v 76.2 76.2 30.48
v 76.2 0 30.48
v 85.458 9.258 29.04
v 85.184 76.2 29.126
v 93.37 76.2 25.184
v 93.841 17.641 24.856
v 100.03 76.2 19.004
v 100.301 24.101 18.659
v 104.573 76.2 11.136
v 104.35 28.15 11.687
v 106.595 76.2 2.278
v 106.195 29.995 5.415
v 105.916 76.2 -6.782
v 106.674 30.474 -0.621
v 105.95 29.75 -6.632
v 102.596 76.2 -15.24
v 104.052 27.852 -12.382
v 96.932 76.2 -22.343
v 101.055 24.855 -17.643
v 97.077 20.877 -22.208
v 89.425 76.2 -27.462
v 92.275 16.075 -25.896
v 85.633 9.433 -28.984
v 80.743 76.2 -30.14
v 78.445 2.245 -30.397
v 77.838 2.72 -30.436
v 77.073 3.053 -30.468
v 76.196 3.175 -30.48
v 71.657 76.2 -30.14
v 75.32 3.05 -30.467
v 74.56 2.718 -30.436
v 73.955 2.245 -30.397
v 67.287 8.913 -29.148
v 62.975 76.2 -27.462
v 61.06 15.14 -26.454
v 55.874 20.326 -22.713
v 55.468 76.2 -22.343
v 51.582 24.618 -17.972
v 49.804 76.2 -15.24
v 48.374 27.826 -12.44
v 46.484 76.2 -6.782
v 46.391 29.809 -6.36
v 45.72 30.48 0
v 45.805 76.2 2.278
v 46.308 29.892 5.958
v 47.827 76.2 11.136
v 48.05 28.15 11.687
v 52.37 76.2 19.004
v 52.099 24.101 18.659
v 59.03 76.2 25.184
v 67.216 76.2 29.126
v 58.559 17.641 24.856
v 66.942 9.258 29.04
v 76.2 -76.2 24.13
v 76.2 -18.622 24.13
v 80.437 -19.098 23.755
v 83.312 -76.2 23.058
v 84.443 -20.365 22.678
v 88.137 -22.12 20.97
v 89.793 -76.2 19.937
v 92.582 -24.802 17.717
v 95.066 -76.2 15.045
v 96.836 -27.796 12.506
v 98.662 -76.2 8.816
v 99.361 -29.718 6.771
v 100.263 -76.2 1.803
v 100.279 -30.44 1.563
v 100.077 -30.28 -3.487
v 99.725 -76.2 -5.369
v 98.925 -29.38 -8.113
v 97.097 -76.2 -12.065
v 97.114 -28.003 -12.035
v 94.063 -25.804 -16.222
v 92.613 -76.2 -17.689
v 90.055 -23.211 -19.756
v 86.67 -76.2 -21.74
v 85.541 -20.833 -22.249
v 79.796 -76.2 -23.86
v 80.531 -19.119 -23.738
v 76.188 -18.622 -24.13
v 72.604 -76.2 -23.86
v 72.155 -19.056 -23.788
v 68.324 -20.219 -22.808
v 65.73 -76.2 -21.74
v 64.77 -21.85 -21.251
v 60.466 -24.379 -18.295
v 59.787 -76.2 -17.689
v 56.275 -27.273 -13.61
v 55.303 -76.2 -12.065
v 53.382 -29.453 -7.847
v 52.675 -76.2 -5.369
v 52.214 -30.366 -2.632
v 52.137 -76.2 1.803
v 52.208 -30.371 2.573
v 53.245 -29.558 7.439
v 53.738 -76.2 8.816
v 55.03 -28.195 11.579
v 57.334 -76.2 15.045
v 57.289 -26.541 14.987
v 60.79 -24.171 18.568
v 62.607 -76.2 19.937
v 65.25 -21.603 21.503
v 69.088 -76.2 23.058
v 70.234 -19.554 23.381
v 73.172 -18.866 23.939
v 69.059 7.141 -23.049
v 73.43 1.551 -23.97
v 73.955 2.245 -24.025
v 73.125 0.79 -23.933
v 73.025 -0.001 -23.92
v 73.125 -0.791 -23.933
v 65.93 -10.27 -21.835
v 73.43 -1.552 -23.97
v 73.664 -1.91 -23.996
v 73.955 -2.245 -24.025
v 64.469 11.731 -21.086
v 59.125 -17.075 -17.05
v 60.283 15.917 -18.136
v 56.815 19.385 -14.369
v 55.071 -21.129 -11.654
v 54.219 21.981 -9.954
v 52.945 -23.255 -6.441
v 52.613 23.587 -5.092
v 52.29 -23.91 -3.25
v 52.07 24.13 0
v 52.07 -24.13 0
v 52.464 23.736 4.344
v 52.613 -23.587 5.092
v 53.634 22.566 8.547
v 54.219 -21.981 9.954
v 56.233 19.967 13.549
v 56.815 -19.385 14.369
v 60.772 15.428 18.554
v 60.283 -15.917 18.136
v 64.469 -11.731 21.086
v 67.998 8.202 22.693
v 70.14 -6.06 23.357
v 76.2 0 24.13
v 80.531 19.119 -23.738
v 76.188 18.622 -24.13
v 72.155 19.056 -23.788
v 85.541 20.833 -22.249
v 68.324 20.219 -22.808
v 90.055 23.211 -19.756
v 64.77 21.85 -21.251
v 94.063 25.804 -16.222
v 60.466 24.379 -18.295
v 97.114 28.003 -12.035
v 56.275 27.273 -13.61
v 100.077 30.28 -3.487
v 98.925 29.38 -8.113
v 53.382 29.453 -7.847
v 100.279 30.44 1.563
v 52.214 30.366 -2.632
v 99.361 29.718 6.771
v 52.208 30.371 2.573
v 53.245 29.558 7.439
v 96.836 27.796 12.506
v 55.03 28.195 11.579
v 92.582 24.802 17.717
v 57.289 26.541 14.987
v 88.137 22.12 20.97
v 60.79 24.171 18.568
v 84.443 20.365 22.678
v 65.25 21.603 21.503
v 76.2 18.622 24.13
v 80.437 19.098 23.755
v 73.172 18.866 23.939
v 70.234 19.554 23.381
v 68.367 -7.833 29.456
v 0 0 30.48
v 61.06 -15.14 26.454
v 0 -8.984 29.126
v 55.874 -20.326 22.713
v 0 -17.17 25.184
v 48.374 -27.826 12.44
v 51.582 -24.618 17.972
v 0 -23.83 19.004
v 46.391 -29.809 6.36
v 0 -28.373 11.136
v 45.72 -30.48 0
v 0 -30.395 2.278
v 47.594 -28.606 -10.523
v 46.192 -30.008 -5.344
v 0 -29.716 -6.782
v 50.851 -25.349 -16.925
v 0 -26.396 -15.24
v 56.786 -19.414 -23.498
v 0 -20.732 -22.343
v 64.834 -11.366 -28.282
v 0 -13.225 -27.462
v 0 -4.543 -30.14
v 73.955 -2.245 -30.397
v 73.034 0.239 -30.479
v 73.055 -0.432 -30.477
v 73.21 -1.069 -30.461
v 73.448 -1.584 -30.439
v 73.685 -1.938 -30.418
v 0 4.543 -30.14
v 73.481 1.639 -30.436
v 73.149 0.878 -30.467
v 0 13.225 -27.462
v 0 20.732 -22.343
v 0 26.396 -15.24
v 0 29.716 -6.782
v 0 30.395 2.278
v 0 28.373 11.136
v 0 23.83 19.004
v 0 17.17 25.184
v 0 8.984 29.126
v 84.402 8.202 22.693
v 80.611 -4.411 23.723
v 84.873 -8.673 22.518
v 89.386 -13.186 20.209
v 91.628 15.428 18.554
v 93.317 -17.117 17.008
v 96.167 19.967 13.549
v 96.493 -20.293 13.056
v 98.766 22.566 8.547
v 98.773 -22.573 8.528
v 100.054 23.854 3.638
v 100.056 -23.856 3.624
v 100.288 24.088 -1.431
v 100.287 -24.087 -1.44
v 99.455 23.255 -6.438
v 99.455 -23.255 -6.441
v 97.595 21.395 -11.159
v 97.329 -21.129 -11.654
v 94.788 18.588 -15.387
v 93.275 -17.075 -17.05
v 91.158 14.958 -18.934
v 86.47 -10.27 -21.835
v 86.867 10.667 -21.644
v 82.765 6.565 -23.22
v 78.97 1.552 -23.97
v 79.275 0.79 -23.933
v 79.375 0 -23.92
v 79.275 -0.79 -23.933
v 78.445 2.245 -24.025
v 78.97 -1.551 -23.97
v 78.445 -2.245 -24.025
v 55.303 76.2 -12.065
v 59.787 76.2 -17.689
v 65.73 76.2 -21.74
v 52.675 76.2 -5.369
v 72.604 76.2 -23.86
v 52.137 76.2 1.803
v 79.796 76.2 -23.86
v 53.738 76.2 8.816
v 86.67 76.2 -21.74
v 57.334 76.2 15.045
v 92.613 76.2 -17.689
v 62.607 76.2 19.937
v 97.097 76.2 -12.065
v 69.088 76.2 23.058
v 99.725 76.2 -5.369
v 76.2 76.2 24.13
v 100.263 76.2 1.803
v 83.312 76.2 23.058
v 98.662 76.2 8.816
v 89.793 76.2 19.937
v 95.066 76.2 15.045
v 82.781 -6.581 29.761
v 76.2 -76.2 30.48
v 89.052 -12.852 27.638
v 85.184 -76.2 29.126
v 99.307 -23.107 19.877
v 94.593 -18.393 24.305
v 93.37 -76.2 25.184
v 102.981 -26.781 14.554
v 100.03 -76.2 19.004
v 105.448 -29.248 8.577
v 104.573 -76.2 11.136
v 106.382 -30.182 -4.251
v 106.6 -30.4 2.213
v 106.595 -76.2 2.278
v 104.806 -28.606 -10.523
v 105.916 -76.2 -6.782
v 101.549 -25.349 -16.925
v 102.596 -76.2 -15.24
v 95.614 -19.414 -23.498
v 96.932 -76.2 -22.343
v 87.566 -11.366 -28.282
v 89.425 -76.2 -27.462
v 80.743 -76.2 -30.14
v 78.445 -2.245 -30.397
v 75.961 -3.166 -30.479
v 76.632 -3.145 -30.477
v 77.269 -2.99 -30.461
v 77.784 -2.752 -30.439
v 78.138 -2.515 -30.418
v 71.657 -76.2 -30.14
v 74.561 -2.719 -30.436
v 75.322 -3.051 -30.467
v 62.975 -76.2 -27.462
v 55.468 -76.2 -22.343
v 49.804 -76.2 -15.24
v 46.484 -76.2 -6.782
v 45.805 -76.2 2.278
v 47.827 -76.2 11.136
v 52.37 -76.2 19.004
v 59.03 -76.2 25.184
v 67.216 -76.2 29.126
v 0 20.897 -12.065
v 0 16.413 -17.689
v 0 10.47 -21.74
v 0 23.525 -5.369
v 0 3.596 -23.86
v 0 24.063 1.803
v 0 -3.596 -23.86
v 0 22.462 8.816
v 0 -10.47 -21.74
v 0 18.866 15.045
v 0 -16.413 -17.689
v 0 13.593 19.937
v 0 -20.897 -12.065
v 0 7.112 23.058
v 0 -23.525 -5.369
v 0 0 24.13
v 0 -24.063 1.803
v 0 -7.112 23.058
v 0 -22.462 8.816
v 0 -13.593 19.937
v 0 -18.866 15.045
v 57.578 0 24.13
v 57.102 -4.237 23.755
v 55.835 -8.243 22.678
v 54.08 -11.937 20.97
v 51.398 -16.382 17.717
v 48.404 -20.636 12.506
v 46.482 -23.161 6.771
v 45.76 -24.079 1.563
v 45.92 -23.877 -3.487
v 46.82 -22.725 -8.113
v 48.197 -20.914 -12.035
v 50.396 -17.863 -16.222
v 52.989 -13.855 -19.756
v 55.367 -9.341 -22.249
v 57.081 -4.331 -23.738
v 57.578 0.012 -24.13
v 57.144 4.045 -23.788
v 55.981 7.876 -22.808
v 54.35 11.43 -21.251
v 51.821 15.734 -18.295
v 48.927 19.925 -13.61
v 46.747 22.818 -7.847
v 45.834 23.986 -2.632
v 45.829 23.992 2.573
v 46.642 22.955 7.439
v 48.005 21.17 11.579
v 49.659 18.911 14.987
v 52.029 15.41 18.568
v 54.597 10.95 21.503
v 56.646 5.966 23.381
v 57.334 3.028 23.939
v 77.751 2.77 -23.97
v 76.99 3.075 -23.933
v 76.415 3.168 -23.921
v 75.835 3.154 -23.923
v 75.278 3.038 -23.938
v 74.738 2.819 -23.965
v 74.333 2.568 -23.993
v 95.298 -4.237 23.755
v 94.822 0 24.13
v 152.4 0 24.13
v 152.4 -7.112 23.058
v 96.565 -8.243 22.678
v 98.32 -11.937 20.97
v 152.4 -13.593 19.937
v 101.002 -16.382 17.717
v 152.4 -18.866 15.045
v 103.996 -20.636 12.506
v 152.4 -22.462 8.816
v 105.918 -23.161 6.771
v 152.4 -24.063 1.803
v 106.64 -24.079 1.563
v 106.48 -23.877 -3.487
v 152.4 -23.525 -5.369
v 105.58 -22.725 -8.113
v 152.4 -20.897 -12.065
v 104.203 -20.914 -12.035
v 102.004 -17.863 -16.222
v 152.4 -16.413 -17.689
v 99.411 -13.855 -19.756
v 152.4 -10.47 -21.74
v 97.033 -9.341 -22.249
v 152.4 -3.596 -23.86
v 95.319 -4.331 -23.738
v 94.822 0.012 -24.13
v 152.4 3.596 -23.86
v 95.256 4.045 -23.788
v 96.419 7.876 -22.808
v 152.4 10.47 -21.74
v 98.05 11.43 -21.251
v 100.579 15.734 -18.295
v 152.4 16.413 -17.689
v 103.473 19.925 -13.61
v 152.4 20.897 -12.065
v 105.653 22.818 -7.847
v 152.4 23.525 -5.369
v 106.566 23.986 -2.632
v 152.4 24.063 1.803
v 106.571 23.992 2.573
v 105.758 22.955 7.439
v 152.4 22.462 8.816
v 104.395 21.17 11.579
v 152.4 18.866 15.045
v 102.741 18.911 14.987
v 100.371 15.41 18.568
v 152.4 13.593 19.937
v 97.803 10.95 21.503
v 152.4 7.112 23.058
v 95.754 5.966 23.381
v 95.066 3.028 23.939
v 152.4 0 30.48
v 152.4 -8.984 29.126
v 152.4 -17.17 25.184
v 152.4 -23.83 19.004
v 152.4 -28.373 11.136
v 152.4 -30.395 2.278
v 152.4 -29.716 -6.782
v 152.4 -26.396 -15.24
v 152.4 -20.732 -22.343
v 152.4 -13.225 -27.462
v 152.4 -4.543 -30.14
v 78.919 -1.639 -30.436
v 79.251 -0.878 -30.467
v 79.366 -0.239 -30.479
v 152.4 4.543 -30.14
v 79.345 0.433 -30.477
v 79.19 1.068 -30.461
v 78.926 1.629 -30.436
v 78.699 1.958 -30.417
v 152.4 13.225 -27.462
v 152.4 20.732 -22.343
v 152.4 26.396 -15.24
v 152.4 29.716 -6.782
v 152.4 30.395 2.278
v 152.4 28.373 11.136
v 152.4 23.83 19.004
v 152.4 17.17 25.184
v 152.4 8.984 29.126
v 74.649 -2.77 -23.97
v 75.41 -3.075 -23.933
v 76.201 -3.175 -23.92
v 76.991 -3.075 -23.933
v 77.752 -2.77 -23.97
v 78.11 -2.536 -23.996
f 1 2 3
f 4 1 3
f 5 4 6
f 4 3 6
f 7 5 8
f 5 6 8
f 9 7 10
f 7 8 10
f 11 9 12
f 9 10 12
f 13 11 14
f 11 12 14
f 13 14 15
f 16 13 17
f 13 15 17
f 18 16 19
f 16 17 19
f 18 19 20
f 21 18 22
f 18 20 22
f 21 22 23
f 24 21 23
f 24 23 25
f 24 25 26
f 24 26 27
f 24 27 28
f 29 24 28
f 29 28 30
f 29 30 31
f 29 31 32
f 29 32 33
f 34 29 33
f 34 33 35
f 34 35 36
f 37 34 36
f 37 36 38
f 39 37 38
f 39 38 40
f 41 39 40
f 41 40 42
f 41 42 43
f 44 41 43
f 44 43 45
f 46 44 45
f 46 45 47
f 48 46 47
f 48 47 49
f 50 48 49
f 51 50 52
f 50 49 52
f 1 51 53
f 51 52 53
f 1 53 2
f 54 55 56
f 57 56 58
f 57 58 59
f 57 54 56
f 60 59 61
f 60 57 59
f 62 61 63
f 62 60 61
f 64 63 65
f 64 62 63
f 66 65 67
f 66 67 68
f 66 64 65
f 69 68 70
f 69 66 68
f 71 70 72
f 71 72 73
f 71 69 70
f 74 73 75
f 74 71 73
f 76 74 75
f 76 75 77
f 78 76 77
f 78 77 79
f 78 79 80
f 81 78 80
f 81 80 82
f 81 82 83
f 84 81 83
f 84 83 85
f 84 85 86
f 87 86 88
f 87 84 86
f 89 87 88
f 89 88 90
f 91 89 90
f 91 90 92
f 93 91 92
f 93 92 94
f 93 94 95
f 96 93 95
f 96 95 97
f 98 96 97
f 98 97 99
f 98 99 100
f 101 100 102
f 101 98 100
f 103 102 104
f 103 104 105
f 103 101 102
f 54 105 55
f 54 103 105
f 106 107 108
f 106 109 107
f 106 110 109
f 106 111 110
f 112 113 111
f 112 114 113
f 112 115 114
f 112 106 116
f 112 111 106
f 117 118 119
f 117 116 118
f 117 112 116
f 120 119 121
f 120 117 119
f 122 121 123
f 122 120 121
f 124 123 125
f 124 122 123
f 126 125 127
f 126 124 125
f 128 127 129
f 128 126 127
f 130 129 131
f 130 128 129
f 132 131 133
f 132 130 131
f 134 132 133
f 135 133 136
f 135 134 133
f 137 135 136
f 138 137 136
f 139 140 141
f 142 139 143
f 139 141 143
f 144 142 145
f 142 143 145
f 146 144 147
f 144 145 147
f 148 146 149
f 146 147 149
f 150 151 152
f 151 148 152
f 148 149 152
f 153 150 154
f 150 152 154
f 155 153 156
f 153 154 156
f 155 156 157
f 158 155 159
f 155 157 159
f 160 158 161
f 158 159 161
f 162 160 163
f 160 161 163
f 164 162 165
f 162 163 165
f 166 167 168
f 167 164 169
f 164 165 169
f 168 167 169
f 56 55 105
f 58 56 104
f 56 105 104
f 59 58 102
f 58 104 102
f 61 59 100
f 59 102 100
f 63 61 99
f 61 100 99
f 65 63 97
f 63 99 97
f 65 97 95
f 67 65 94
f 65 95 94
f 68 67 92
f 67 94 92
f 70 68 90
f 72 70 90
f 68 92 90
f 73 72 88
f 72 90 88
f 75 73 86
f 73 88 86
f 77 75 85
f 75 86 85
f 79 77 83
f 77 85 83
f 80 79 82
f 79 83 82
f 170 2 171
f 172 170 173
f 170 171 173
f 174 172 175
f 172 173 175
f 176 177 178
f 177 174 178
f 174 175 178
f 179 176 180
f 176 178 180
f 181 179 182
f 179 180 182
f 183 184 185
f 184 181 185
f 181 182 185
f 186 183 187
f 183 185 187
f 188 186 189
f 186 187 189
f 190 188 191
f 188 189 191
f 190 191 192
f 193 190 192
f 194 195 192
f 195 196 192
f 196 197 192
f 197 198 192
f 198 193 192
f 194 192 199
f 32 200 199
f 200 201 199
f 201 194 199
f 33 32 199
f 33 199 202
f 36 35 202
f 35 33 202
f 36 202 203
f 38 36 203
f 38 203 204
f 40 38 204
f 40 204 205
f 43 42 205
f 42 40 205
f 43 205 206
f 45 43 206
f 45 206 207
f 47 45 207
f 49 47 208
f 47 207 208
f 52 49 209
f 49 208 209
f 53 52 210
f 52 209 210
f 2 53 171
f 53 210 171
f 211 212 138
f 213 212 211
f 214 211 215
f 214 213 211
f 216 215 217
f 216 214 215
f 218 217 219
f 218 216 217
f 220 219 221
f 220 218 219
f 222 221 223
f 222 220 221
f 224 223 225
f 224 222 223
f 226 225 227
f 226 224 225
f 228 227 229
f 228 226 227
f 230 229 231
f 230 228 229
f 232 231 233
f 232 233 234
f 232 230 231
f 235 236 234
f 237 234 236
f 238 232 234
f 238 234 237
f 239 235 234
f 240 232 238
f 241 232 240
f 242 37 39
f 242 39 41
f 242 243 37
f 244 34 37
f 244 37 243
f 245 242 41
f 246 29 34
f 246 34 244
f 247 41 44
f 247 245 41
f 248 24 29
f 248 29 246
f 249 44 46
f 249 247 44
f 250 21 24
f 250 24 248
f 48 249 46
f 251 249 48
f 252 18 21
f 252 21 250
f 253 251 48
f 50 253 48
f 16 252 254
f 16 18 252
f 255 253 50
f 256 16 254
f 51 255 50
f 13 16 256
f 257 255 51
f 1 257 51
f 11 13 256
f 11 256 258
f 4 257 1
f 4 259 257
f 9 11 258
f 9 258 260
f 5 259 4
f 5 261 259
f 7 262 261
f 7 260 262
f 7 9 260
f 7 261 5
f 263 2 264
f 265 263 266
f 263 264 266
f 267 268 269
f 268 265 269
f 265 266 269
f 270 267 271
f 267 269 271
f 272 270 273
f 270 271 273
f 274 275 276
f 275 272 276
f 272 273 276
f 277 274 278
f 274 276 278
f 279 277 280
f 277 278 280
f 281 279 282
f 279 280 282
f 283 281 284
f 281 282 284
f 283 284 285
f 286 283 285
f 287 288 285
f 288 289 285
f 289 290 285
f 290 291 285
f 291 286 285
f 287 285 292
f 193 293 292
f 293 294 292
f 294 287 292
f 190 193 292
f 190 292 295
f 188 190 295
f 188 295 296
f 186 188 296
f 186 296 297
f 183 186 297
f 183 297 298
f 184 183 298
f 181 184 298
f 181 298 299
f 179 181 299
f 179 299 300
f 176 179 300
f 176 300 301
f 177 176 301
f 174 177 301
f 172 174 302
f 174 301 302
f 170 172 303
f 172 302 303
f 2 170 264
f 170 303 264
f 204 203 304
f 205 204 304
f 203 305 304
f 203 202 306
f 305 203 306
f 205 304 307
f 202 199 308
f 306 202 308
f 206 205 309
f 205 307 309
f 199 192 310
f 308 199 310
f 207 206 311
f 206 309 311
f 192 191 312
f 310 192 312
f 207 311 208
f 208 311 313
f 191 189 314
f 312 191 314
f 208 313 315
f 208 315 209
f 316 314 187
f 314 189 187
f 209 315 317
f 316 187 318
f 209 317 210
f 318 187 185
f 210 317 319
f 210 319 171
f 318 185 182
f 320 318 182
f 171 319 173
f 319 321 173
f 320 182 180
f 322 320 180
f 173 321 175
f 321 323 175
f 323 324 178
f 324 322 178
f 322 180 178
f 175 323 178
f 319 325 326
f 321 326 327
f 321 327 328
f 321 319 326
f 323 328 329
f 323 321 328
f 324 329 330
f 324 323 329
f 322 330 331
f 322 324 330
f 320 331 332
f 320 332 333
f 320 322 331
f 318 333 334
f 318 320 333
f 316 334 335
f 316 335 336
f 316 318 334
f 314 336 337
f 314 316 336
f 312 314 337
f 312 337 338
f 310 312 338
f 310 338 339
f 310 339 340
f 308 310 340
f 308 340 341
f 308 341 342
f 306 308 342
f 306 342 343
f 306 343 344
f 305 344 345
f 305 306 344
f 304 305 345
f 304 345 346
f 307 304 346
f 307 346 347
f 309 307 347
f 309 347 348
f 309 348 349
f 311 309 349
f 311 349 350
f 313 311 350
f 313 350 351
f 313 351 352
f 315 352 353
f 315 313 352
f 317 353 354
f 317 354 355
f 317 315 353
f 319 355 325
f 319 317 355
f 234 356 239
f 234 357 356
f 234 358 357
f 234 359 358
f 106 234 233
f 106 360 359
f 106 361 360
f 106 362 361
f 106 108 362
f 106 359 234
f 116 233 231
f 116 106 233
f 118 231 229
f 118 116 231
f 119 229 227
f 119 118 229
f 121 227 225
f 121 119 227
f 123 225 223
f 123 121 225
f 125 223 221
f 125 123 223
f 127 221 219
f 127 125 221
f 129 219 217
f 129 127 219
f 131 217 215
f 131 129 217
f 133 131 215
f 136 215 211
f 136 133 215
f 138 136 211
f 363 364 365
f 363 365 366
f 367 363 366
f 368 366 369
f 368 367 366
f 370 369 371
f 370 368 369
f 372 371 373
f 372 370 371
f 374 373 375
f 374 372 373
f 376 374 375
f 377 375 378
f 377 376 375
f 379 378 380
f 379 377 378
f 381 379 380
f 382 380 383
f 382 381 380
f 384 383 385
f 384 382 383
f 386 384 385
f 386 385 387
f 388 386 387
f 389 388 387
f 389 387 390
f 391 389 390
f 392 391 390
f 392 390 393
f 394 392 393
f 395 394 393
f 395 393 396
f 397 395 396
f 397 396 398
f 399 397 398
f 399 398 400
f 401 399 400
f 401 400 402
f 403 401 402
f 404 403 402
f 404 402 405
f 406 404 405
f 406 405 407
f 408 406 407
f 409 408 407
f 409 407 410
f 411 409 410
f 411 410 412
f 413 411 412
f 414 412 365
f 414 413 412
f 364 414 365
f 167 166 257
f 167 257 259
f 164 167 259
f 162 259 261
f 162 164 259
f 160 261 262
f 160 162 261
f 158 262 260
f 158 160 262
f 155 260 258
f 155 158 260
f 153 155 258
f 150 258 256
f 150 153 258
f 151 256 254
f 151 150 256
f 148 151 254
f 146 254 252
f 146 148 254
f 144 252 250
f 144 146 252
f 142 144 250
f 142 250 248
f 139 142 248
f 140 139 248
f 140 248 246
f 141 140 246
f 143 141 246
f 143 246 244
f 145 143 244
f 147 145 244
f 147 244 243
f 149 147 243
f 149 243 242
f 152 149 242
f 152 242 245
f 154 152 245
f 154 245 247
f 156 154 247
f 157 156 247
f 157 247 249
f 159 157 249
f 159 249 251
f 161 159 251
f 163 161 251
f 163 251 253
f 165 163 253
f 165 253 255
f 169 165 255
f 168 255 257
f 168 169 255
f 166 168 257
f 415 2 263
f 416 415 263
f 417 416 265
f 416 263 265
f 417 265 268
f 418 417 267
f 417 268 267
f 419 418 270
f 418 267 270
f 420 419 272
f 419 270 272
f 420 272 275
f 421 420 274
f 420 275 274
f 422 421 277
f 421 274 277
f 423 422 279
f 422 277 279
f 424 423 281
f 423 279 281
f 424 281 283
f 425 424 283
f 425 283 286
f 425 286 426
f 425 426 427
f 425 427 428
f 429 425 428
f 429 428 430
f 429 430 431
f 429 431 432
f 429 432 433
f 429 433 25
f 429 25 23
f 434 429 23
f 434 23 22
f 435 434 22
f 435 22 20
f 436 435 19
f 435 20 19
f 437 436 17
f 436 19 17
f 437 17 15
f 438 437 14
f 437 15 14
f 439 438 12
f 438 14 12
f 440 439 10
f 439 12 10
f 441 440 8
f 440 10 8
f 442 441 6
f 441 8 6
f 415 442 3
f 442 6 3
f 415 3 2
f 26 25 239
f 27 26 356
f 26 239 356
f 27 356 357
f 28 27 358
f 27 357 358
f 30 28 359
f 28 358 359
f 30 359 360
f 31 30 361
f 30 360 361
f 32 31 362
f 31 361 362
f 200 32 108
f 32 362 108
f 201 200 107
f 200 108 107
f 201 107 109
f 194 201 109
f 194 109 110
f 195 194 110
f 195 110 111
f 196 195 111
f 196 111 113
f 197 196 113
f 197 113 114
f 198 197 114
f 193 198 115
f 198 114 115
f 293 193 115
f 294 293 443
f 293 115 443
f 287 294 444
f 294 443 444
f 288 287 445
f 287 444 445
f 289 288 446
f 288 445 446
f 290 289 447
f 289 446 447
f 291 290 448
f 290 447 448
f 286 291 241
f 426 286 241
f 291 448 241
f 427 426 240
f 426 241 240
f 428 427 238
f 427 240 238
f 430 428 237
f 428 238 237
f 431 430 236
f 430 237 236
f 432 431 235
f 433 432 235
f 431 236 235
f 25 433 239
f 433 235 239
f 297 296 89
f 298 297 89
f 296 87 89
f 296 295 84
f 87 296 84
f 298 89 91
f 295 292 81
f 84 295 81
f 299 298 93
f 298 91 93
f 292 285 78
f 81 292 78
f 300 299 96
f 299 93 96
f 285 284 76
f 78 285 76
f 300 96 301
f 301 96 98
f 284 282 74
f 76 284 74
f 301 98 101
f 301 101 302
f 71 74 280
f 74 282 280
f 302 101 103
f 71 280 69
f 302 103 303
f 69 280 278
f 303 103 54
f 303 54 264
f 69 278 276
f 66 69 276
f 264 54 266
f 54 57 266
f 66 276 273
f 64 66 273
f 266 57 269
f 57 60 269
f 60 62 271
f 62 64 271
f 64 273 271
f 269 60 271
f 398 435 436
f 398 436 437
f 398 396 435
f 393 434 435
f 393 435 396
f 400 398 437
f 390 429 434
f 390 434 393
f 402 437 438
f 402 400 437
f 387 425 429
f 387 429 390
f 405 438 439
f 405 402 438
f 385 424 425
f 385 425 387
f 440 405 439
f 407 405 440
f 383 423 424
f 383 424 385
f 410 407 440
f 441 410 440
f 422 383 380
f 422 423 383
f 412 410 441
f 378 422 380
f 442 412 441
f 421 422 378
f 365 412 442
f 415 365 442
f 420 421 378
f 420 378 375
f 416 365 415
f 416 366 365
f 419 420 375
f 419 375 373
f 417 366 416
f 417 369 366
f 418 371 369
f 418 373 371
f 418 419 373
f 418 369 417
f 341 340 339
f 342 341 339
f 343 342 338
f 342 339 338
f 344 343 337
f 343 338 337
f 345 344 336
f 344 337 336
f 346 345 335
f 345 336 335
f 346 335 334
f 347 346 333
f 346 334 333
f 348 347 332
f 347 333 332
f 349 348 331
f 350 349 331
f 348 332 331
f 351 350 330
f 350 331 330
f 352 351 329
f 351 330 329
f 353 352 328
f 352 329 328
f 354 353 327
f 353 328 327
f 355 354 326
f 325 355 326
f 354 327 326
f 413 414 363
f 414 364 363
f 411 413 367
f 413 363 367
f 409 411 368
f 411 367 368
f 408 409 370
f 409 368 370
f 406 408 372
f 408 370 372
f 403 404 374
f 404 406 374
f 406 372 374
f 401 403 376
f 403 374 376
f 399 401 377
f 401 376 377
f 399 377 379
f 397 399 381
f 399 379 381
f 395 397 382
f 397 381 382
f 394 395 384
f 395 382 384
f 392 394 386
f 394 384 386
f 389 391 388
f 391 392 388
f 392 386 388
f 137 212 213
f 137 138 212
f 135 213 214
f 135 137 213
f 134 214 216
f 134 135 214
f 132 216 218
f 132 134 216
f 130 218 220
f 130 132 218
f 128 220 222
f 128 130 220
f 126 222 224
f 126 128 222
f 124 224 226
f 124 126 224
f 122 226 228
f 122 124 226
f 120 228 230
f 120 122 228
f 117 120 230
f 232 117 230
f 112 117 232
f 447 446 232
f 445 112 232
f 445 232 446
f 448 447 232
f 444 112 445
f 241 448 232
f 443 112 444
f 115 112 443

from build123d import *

# Parameters (mm, degrees)
SKETCH1_R                = 30.48
SKETCH1_R_2              = 24.13
BOSS_EXTRUDE1_DEPTH      = 152.4
BOSS_EXTRUDE2_DEPTH      = 76.2
BOSS_EXTRUDE2_DEPTH_BACK = 76.2
SKETCH2_R                = 30.48
SKETCH2_R_2              = 24.13
SKETCH4_R                = 3.175
CUT_EXTRUDE1_DEPTH       = 174.093126512


with BuildPart() as part:
    # Sketch1 → Boss-Extrude1 (new body)
    with BuildSketch(Plane(origin=(0, 0, 0), x_dir=(0, 0, -1), z_dir=(1, 0, 0))):
        Circle(SKETCH1_R)
        Circle(SKETCH1_R_2, mode=Mode.SUBTRACT)
    extrude(amount=BOSS_EXTRUDE1_DEPTH)

    # Sketch2 → Boss-Extrude2 (add, two sides: drawn at the far end of the back side and taken through both)
    with BuildSketch(Plane(origin=(0, 0, 0), x_dir=(1, 0, 0), z_dir=(0, 1, 0)).offset(-BOSS_EXTRUDE2_DEPTH_BACK)):
        with Locations((76.2, 0)):
            Circle(SKETCH2_R)
        with Locations((76.2, 0)):
            Circle(SKETCH2_R_2, mode=Mode.SUBTRACT)
    extrude(amount=BOSS_EXTRUDE2_DEPTH + BOSS_EXTRUDE2_DEPTH_BACK)

    # Sketch4 → Cut-Extrude1 (cut, through all)
    with BuildSketch(Plane.XY):
        with Locations((76.2, 0)):
            Circle(SKETCH4_R)
    extrude(amount=-CUT_EXTRUDE1_DEPTH, mode=Mode.SUBTRACT)


solid = part.part
